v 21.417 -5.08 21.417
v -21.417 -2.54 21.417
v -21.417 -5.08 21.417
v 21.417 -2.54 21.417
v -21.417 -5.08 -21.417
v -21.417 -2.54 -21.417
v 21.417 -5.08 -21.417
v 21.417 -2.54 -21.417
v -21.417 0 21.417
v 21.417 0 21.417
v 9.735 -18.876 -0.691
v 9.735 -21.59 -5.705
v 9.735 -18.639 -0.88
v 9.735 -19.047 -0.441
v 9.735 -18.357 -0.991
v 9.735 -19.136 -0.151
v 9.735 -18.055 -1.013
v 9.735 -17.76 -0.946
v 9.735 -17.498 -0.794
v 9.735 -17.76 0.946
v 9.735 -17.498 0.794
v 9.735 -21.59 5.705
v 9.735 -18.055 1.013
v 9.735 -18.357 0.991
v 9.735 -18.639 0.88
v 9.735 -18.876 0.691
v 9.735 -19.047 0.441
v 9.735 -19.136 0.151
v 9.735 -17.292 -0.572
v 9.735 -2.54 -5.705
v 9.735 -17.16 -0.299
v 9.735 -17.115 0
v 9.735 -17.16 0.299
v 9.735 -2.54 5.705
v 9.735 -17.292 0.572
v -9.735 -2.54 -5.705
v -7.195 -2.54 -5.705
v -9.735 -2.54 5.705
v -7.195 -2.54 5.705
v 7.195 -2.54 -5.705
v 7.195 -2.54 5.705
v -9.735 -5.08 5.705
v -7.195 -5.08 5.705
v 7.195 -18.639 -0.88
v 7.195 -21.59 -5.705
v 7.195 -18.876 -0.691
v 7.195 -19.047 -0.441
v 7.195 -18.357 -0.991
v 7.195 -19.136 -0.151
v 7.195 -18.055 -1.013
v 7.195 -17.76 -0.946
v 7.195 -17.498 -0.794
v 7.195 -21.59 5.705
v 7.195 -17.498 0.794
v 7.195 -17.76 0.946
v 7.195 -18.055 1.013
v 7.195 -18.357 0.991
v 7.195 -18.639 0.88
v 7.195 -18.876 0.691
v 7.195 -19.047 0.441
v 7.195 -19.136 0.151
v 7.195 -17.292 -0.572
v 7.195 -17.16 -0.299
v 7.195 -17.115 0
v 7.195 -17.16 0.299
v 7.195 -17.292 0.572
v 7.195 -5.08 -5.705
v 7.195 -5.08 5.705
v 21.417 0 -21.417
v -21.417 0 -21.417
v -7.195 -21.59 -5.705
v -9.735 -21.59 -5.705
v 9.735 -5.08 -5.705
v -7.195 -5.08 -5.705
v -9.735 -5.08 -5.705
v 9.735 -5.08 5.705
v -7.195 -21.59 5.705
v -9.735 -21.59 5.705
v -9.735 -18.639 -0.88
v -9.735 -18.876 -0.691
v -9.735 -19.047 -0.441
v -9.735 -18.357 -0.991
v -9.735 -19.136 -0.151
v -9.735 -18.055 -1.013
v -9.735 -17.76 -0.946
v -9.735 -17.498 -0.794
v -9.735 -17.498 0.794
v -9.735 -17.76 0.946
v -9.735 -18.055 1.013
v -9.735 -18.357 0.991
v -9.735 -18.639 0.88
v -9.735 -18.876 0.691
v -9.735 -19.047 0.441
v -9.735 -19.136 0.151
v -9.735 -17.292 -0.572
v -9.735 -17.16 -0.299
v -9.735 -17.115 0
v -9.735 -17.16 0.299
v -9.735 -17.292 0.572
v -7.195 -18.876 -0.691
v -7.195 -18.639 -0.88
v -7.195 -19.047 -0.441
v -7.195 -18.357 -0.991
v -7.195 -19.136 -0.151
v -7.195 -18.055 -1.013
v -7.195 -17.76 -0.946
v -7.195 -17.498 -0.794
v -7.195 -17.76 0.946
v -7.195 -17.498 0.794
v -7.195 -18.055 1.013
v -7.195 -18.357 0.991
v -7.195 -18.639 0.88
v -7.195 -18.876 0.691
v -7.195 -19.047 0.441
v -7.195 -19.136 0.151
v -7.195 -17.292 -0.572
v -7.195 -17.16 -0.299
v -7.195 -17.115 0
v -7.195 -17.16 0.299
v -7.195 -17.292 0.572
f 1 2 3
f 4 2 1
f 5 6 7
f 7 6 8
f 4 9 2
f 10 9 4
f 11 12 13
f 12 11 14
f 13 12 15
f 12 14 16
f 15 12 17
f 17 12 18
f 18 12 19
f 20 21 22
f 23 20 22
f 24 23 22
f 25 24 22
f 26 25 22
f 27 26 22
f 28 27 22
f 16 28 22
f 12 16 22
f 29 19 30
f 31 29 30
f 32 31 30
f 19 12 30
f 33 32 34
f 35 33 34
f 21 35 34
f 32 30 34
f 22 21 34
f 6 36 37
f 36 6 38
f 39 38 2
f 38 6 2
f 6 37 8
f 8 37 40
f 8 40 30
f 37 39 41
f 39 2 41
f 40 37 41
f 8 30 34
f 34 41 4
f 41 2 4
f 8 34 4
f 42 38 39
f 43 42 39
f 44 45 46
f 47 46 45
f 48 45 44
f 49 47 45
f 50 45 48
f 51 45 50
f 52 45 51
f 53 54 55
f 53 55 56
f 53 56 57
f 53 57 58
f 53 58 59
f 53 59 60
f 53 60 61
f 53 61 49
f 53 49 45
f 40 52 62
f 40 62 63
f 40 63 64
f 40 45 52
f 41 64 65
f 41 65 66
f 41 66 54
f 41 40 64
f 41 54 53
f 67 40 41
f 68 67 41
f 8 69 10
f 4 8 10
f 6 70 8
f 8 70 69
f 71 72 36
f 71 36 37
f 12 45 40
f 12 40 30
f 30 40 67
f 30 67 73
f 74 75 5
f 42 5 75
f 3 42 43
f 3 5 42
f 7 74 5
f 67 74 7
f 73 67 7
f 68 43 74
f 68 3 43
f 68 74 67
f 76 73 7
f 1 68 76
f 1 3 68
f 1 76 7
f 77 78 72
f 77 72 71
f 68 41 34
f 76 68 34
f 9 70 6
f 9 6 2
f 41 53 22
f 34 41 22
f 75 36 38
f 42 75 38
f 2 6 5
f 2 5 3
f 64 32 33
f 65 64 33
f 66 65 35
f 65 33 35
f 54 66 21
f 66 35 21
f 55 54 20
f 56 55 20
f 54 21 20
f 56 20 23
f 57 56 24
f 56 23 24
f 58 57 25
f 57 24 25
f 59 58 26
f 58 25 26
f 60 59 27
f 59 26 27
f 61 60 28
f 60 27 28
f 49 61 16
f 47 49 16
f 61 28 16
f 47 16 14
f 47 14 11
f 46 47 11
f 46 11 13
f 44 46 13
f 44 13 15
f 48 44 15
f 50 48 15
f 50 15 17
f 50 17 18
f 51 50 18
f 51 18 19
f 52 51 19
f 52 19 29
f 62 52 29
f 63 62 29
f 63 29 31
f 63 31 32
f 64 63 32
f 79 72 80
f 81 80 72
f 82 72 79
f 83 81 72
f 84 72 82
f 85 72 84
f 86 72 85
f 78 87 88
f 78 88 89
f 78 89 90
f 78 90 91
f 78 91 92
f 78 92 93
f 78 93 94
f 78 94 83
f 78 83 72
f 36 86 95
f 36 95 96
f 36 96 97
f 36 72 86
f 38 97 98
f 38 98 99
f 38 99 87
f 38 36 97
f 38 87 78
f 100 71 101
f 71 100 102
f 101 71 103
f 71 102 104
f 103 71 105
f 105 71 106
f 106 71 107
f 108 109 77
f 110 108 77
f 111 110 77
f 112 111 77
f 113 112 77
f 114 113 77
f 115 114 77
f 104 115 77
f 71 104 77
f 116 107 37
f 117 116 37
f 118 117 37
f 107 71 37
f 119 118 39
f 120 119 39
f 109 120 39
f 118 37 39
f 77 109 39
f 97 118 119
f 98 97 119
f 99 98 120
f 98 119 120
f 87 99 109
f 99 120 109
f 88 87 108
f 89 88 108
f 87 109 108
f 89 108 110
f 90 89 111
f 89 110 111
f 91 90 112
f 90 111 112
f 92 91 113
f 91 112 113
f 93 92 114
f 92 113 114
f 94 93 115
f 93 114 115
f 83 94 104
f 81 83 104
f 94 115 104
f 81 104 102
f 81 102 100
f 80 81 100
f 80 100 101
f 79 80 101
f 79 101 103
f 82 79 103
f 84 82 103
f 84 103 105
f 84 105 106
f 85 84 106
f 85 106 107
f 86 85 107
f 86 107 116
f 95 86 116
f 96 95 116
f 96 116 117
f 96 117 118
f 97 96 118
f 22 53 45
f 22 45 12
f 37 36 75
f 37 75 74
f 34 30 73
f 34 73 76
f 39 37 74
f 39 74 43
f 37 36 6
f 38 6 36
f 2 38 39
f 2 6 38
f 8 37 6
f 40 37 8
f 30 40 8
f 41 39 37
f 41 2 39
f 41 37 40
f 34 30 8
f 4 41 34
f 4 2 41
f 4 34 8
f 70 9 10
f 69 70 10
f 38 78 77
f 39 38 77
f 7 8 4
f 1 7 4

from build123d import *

# Parameters (mm, degrees)
F0_W        = 42.833638
F0_H        = 42.833634
F1_DEPTH    = 2.54
F2_W        = 2.54
F2_H        = 11.409302
F3_DEPTH    = 19.05
F4_R        = 1.016
F5_DEPTH    = 31.152836
F1_FACE_W   = 42.833638
F1_FACE_H   = 42.833634
F1_FACE_W_2 = 2.54
F1_FACE_H_2 = 11.409302
F6_DEPTH    = 2.54


with BuildPart() as f1:
    # F0 (on Front) → F1 (new body)
    with BuildSketch(Plane.XZ):
        Rectangle(F0_W, F0_H)
    extrude(amount=F1_DEPTH)

    # F2 (on face) → F3 (join)
    with BuildSketch(Plane.XZ.offset(2.54)):
        with Locations((-8.465018, 0)):
            Rectangle(F2_W, F2_H)
        with Locations((8.465018, 0)):
            Rectangle(F2_W, F2_H)
    extrude(amount=F3_DEPTH)

    # F4 (on face) → F5 (cut, through all)
    with BuildSketch(Plane.YZ.offset(9.735018)):
        with Locations((-18.131167, 0)):
            Circle(F4_R)
    extrude(amount=-F5_DEPTH, mode=Mode.SUBTRACT)


with BuildPart() as f6:
    # F1_face (on face) → F6 (new body)
    with BuildSketch(Plane.XZ.offset(2.54)):
        Rectangle(F1_FACE_W, F1_FACE_H)
        with Locations((-8.465018, 0)):
            Rectangle(F1_FACE_W_2, F1_FACE_H_2, mode=Mode.SUBTRACT)
        with Locations((8.465018, 0)):
            Rectangle(F1_FACE_W_2, F1_FACE_H_2, mode=Mode.SUBTRACT)
    extrude(amount=F6_DEPTH)


solid = Compound([f1.part, f6.part])
